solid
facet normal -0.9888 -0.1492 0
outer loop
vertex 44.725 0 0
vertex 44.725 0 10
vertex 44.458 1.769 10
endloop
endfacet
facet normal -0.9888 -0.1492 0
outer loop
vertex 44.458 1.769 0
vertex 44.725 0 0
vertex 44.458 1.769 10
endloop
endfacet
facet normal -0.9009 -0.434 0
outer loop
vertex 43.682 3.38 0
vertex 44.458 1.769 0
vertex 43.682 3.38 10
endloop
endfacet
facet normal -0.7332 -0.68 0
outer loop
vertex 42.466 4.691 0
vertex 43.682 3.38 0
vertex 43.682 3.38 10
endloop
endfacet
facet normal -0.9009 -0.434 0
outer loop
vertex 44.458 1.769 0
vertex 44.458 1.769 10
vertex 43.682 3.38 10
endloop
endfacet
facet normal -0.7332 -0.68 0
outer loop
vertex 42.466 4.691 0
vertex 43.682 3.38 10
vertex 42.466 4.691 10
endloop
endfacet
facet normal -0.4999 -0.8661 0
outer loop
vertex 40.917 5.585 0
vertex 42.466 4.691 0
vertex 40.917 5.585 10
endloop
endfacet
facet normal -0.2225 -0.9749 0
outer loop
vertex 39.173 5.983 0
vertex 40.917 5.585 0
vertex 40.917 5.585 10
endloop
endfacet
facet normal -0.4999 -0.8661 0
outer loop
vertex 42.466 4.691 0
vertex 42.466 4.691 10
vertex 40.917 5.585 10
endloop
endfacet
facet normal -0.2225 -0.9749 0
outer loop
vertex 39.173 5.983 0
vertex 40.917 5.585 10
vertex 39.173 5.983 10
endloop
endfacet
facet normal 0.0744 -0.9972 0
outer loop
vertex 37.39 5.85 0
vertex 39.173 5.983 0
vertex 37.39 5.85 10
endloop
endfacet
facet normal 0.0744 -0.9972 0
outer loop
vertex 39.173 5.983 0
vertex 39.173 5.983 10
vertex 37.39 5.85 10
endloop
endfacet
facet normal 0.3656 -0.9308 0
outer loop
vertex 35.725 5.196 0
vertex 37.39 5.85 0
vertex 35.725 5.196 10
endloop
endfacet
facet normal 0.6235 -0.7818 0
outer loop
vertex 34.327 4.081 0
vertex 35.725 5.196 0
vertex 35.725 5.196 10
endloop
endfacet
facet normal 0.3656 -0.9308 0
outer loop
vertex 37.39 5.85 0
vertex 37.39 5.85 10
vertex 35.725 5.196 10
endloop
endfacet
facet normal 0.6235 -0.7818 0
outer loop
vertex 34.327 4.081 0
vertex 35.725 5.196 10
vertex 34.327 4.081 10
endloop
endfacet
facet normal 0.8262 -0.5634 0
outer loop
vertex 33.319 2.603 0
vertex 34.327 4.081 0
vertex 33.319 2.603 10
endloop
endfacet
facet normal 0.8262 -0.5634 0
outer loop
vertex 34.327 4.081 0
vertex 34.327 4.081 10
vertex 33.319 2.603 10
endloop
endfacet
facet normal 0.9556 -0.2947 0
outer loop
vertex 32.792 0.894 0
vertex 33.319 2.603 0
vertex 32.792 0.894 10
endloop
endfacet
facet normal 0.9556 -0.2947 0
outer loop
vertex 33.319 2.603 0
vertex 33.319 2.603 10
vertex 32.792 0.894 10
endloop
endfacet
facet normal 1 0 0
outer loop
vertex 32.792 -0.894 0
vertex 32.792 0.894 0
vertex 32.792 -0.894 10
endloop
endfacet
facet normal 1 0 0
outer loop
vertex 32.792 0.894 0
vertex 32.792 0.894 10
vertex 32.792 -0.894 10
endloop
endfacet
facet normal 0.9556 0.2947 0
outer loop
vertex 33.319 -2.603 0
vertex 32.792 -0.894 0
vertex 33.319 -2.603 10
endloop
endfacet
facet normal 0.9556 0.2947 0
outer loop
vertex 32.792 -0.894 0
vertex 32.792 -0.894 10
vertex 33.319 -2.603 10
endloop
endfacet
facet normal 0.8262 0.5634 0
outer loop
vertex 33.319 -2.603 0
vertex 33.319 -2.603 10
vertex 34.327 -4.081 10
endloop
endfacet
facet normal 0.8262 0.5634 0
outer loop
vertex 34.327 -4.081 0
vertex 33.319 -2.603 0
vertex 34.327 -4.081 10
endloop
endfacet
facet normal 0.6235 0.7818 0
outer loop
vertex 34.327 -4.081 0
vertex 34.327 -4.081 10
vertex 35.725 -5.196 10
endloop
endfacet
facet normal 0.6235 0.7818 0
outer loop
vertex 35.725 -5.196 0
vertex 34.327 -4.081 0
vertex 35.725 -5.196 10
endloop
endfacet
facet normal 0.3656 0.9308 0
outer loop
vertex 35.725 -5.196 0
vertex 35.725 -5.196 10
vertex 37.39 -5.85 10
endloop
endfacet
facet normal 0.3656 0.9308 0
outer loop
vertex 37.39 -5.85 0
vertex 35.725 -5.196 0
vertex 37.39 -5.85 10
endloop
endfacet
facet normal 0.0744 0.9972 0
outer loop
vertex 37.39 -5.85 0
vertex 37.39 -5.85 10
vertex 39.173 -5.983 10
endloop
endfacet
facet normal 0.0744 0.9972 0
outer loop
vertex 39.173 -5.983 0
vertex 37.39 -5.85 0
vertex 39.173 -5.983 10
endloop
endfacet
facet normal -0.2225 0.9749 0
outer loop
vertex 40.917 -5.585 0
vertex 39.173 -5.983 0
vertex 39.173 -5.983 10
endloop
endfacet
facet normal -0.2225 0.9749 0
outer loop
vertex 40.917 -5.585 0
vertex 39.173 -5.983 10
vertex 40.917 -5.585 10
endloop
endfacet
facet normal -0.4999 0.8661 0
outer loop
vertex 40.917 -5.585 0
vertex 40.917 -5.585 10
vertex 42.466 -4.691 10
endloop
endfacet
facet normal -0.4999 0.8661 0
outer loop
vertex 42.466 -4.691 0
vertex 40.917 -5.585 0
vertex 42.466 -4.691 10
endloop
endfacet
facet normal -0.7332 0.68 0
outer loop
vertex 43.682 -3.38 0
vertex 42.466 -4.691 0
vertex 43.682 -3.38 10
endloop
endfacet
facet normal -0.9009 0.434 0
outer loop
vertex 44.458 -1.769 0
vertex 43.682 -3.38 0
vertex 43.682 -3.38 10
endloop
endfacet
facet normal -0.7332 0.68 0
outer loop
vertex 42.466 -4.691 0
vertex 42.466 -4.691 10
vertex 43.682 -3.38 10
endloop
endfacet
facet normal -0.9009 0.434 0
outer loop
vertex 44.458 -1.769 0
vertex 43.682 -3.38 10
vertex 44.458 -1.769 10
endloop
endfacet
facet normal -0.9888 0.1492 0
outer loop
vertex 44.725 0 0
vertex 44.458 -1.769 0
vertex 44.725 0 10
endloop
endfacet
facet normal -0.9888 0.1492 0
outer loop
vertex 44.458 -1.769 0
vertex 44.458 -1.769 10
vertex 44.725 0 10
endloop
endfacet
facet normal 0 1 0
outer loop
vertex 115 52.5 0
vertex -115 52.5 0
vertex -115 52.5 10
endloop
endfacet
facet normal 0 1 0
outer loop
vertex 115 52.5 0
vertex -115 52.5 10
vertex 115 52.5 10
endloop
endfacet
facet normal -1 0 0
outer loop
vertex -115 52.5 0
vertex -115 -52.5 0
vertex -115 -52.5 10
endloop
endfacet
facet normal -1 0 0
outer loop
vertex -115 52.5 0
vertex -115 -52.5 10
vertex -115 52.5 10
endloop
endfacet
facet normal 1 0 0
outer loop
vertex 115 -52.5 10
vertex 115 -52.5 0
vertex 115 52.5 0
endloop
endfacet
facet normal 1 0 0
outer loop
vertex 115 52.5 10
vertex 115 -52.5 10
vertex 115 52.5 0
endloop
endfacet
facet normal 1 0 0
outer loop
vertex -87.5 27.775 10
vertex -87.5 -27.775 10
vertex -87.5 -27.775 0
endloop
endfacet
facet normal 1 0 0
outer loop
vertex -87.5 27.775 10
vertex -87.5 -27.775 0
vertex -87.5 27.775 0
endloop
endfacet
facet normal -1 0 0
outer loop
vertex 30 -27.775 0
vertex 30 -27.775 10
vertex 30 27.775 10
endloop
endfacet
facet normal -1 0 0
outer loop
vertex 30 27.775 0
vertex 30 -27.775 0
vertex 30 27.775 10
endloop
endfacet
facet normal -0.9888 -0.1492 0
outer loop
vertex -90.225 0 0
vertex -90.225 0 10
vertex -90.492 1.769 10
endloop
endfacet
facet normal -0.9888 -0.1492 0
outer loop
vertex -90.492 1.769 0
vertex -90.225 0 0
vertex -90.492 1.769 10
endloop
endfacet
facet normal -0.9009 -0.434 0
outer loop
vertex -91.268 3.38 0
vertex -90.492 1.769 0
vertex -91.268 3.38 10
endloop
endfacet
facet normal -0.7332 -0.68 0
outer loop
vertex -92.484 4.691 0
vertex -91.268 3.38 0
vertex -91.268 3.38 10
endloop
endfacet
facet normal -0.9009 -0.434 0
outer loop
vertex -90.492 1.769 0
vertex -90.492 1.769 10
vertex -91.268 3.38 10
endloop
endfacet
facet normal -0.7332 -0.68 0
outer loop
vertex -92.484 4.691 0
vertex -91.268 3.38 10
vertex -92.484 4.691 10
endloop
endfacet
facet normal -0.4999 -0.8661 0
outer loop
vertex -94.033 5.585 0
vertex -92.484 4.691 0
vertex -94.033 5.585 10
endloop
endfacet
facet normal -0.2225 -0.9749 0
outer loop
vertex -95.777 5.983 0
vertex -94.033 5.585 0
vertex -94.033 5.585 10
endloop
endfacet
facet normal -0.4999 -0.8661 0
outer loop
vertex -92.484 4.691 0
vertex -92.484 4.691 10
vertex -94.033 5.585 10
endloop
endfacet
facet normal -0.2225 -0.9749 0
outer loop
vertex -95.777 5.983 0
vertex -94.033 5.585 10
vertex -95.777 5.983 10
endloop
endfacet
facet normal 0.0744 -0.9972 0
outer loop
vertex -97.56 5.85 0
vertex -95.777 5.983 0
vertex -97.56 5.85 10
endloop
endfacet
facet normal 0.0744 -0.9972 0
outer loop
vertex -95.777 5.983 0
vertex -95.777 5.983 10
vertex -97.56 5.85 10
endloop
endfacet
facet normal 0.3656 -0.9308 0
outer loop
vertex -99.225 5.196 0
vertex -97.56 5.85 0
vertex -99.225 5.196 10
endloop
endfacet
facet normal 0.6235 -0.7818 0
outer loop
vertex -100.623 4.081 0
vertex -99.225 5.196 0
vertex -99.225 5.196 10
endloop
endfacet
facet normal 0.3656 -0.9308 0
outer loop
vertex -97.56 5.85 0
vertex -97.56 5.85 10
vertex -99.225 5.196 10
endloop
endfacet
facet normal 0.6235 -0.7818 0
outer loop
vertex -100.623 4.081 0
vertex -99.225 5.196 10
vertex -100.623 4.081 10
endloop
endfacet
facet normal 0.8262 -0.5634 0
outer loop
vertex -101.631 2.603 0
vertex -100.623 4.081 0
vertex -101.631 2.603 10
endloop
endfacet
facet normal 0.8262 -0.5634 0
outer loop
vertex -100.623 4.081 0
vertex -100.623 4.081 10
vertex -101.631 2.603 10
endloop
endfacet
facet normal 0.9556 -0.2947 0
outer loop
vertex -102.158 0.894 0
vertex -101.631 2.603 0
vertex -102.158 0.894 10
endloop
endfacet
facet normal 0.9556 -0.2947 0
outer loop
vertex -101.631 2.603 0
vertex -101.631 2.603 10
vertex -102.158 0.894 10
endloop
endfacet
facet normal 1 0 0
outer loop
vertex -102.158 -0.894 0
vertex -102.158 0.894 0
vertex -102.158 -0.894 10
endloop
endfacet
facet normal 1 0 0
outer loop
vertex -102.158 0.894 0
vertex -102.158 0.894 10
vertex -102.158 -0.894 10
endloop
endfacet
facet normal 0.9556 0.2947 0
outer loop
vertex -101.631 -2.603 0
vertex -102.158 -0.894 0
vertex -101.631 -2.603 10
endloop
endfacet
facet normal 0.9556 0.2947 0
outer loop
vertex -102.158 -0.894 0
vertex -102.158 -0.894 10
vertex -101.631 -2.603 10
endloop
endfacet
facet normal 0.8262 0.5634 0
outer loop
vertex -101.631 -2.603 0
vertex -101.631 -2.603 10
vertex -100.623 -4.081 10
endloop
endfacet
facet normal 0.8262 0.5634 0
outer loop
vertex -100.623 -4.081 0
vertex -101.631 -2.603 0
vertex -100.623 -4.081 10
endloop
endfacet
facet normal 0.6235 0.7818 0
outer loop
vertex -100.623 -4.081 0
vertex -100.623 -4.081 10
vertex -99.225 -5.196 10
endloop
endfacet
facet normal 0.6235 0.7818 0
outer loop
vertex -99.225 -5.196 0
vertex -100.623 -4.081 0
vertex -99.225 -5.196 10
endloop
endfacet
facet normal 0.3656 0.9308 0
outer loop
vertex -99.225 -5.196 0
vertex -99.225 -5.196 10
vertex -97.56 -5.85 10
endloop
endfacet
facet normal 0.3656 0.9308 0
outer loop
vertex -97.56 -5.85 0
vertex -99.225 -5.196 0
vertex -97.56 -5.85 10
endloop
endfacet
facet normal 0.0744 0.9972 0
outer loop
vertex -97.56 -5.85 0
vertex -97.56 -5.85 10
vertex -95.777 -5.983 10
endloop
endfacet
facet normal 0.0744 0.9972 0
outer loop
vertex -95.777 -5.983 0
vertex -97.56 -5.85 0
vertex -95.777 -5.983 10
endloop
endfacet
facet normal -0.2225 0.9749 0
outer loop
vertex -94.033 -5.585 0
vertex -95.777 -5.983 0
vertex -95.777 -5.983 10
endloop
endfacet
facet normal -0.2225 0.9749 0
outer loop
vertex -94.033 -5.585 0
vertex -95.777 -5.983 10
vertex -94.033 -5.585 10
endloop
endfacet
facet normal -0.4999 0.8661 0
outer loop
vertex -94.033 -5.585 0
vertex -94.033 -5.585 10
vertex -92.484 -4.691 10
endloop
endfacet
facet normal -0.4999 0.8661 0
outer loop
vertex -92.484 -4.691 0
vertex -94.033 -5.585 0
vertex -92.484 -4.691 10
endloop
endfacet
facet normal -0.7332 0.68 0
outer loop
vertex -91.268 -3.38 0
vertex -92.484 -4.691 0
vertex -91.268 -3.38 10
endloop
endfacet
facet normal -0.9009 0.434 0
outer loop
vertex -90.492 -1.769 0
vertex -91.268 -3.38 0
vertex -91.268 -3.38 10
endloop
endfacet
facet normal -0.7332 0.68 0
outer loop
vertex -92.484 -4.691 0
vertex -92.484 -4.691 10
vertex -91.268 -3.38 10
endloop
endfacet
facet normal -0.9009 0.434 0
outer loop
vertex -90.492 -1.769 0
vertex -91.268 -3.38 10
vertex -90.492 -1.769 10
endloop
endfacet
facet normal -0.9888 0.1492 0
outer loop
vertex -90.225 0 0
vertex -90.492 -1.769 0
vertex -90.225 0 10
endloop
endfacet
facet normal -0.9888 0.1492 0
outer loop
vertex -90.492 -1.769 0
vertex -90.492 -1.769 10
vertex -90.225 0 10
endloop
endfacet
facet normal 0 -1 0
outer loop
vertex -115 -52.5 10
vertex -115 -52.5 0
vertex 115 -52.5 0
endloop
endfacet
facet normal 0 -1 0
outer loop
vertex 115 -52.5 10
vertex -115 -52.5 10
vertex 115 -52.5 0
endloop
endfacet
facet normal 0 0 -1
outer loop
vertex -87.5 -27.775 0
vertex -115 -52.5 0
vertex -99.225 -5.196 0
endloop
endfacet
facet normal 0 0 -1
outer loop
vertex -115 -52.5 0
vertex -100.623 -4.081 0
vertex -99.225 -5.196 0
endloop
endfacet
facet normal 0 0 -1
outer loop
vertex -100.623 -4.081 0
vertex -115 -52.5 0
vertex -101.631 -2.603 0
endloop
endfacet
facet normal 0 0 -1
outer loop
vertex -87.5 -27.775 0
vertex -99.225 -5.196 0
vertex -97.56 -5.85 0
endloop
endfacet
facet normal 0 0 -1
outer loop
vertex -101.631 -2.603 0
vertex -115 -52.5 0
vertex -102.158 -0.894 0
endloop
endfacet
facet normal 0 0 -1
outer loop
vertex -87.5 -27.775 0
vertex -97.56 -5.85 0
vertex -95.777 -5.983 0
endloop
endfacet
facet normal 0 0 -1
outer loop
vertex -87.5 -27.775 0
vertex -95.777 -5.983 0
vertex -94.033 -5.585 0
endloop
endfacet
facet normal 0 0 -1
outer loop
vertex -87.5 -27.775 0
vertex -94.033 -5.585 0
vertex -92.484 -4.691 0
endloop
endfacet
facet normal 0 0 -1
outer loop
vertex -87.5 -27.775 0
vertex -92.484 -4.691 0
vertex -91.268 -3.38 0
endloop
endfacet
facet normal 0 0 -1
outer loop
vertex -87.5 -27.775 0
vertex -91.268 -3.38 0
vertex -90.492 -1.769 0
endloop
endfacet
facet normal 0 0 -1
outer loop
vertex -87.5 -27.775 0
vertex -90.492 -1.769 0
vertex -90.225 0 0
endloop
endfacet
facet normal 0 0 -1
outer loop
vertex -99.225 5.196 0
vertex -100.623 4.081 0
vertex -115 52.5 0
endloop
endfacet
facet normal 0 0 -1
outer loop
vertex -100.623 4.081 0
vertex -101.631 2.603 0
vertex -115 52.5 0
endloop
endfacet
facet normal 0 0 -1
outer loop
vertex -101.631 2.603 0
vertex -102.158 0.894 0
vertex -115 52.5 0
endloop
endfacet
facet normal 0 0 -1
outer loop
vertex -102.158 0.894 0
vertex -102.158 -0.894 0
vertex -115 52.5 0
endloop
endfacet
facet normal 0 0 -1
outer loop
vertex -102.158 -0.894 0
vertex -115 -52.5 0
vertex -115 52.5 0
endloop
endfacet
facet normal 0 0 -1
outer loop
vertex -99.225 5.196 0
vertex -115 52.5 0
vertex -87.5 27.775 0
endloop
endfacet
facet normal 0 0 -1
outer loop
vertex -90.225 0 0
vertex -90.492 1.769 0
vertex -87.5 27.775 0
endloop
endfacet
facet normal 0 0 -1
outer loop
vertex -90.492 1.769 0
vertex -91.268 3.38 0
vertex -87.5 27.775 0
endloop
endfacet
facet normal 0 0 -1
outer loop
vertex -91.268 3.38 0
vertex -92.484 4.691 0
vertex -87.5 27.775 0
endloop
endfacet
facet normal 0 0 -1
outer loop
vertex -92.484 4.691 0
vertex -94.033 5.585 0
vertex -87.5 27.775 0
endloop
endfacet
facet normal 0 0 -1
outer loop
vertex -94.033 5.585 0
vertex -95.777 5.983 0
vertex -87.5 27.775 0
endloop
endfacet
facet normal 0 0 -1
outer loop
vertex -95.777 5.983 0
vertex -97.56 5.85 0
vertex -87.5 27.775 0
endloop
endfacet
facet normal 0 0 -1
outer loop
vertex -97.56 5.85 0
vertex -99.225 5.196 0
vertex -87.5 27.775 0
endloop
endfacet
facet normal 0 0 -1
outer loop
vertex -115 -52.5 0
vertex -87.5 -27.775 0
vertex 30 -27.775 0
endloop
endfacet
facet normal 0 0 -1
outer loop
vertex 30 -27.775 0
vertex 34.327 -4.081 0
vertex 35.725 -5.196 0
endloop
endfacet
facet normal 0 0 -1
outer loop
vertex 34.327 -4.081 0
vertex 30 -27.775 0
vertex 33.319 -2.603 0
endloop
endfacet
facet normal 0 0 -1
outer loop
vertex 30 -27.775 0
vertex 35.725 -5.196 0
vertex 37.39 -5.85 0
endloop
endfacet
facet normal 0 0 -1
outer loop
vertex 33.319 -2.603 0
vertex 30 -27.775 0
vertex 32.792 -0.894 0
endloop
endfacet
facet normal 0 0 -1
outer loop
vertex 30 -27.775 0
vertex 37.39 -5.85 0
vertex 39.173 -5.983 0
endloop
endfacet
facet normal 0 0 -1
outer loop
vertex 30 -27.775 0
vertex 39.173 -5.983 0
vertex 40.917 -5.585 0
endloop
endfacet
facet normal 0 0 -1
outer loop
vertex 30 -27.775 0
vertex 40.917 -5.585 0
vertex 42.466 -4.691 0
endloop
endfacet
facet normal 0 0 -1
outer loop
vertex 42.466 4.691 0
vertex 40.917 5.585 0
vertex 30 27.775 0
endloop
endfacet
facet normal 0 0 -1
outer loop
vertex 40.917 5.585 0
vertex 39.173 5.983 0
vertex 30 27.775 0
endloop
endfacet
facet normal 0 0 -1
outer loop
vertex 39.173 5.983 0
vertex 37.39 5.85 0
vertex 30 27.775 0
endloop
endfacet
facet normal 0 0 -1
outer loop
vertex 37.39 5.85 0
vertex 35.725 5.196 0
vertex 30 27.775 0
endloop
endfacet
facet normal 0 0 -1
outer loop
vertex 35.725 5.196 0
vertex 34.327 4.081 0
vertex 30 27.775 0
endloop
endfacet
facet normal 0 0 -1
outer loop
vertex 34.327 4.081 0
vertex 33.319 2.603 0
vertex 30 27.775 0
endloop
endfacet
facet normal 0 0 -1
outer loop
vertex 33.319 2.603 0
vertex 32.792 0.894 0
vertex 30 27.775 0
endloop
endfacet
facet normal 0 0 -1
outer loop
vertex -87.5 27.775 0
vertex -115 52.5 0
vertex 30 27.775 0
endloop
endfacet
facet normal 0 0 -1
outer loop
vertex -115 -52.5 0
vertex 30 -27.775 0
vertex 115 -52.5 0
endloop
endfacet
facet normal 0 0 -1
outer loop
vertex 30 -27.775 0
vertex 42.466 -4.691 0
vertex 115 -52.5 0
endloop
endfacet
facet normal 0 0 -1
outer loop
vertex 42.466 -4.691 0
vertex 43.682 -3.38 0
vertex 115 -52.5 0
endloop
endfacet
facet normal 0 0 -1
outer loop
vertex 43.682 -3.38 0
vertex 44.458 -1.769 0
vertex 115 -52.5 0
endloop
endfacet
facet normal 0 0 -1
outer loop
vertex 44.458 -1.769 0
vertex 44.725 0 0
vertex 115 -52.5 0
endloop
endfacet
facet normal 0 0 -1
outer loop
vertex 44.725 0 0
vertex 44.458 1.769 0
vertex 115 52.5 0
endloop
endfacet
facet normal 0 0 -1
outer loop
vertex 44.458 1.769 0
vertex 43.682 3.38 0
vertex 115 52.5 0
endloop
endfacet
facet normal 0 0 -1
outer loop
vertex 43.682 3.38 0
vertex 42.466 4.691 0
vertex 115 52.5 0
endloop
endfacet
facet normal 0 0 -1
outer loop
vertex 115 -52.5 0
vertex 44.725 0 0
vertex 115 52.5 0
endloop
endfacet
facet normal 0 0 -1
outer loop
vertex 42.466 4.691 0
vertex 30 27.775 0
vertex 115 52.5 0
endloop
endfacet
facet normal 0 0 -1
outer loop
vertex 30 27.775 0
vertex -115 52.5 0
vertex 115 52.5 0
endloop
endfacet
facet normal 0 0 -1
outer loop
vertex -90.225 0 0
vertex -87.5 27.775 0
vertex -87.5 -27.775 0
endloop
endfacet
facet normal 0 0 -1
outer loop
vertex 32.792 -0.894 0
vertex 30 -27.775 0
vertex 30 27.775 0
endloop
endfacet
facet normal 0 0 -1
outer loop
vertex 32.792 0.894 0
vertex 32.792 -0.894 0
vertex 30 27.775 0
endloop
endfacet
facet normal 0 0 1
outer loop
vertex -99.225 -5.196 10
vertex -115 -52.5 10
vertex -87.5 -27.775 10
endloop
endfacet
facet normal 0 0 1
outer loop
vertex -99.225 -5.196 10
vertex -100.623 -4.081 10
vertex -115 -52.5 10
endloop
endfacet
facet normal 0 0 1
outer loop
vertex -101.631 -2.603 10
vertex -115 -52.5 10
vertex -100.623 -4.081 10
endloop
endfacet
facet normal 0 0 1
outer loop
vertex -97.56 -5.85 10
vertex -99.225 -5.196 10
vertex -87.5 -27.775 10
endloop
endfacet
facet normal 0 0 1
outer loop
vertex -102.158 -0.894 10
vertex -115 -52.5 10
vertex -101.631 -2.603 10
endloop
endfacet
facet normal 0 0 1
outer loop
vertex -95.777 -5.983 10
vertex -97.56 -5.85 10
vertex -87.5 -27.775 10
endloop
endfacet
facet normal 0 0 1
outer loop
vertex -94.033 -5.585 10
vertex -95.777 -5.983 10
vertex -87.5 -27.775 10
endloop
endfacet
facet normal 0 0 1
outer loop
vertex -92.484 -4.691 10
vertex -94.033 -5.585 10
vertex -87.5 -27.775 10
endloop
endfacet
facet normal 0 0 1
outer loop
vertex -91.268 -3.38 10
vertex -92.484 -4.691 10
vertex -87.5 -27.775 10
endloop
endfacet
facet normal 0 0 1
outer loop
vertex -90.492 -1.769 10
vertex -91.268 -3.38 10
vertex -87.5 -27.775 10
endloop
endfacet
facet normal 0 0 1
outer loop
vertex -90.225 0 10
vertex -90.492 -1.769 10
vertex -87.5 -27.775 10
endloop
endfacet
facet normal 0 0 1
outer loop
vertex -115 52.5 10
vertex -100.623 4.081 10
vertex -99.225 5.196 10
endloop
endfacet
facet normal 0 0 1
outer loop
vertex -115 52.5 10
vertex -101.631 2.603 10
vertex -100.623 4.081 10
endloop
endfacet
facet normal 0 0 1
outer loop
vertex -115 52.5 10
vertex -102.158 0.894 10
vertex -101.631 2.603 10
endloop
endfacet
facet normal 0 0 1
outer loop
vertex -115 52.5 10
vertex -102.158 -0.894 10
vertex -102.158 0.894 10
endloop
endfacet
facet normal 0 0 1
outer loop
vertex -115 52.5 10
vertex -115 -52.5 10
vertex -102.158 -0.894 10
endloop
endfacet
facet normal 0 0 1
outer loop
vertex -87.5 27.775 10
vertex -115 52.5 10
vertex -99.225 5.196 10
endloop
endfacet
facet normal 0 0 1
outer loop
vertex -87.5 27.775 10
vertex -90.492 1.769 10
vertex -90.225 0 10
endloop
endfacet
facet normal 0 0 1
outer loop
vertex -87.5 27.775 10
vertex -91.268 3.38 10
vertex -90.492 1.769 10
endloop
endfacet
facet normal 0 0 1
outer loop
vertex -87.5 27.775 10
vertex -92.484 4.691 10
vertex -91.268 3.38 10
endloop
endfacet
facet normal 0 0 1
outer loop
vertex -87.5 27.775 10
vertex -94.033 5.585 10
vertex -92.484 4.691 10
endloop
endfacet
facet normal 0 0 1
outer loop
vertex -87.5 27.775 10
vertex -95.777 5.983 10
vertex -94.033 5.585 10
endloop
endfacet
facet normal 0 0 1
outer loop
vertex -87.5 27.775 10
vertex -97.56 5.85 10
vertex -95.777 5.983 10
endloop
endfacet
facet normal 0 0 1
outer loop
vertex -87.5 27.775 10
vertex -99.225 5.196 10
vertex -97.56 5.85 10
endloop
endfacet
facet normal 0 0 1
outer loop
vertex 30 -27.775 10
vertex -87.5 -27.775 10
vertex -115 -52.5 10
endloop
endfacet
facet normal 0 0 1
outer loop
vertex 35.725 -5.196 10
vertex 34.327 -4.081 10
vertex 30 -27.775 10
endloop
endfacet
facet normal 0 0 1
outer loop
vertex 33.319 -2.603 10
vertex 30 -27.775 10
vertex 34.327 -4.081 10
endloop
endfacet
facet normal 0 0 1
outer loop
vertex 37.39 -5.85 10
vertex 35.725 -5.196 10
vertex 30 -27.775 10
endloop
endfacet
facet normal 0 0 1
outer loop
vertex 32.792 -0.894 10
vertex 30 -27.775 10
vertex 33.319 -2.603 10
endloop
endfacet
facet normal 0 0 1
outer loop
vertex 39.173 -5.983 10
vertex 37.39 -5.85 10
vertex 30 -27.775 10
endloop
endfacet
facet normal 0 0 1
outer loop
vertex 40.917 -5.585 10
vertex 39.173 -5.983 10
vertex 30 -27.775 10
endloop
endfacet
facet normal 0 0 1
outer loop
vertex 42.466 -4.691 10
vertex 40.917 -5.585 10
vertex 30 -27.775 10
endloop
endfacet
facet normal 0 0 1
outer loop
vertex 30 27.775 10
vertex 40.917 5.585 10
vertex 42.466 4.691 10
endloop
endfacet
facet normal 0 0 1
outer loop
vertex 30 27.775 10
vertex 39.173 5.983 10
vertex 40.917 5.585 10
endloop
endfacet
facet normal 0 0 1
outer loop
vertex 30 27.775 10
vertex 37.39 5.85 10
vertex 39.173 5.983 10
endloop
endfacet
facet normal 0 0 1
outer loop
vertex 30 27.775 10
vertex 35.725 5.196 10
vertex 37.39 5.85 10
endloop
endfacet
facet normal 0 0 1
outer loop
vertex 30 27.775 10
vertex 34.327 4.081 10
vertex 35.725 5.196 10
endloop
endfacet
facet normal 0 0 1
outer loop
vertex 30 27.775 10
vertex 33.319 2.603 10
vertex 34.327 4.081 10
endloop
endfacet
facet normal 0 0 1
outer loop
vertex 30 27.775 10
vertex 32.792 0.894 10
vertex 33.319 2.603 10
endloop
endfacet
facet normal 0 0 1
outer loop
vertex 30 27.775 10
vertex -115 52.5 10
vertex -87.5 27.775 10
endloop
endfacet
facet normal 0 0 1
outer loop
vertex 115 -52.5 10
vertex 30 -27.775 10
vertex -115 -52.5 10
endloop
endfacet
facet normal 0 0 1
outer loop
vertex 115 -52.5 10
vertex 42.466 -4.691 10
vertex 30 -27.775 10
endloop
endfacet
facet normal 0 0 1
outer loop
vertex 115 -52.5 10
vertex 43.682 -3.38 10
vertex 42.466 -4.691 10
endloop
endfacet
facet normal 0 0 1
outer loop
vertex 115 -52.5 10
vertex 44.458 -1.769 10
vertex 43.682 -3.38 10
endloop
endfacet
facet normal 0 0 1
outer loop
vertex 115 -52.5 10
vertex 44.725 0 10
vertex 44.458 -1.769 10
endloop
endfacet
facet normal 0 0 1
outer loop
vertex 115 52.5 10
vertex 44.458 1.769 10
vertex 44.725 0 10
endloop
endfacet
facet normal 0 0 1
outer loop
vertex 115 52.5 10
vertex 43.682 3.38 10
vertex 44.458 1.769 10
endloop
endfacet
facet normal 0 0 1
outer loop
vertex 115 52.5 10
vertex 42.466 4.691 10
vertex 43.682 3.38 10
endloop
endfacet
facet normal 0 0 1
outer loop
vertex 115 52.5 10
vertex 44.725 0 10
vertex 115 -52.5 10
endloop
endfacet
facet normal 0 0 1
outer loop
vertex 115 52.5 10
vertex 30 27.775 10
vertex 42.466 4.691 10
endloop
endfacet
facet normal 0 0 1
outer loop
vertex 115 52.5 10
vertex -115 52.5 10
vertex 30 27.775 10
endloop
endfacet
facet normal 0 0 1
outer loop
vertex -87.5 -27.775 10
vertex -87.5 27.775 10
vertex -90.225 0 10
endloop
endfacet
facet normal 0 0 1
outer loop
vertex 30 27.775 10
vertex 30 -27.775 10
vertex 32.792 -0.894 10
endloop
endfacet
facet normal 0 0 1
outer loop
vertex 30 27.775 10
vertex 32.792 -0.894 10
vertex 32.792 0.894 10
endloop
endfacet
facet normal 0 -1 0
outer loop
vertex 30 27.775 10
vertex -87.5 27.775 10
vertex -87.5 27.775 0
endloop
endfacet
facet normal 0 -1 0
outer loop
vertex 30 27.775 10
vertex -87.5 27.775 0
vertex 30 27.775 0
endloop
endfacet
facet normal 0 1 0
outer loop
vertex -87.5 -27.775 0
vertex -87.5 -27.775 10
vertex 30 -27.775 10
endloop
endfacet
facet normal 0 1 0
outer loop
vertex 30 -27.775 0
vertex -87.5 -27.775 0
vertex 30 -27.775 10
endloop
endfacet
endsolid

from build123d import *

# Parameters (mm, degrees)
SKETCH1_W           = 230
SKETCH1_H           = 105
BOSS_EXTRUDE1_DEPTH = 10
SKETCH2_R           = 6
SKETCH2_W           = 117.5
SKETCH2_H           = 55.55
CUT_EXTRUDE3_DEPTH  = 10


with BuildPart() as part:
    # Sketch1 → Boss-Extrude1 (new body)
    with BuildSketch(Plane.XY):
        Rectangle(SKETCH1_W, SKETCH1_H)
    extrude(amount=BOSS_EXTRUDE1_DEPTH)

    # Sketch2 → Cut-Extrude3 (cut)
    with BuildSketch(Plane.XY.offset(10)):
        with Locations((38.725, 0)):
            Circle(SKETCH2_R)
        with Locations((-96.225, 0)):
            Circle(SKETCH2_R)
        with Locations((-28.75, 0)):
            Rectangle(SKETCH2_W, SKETCH2_H)
    extrude(amount=-CUT_EXTRUDE3_DEPTH, mode=Mode.SUBTRACT)


solid = part.part
